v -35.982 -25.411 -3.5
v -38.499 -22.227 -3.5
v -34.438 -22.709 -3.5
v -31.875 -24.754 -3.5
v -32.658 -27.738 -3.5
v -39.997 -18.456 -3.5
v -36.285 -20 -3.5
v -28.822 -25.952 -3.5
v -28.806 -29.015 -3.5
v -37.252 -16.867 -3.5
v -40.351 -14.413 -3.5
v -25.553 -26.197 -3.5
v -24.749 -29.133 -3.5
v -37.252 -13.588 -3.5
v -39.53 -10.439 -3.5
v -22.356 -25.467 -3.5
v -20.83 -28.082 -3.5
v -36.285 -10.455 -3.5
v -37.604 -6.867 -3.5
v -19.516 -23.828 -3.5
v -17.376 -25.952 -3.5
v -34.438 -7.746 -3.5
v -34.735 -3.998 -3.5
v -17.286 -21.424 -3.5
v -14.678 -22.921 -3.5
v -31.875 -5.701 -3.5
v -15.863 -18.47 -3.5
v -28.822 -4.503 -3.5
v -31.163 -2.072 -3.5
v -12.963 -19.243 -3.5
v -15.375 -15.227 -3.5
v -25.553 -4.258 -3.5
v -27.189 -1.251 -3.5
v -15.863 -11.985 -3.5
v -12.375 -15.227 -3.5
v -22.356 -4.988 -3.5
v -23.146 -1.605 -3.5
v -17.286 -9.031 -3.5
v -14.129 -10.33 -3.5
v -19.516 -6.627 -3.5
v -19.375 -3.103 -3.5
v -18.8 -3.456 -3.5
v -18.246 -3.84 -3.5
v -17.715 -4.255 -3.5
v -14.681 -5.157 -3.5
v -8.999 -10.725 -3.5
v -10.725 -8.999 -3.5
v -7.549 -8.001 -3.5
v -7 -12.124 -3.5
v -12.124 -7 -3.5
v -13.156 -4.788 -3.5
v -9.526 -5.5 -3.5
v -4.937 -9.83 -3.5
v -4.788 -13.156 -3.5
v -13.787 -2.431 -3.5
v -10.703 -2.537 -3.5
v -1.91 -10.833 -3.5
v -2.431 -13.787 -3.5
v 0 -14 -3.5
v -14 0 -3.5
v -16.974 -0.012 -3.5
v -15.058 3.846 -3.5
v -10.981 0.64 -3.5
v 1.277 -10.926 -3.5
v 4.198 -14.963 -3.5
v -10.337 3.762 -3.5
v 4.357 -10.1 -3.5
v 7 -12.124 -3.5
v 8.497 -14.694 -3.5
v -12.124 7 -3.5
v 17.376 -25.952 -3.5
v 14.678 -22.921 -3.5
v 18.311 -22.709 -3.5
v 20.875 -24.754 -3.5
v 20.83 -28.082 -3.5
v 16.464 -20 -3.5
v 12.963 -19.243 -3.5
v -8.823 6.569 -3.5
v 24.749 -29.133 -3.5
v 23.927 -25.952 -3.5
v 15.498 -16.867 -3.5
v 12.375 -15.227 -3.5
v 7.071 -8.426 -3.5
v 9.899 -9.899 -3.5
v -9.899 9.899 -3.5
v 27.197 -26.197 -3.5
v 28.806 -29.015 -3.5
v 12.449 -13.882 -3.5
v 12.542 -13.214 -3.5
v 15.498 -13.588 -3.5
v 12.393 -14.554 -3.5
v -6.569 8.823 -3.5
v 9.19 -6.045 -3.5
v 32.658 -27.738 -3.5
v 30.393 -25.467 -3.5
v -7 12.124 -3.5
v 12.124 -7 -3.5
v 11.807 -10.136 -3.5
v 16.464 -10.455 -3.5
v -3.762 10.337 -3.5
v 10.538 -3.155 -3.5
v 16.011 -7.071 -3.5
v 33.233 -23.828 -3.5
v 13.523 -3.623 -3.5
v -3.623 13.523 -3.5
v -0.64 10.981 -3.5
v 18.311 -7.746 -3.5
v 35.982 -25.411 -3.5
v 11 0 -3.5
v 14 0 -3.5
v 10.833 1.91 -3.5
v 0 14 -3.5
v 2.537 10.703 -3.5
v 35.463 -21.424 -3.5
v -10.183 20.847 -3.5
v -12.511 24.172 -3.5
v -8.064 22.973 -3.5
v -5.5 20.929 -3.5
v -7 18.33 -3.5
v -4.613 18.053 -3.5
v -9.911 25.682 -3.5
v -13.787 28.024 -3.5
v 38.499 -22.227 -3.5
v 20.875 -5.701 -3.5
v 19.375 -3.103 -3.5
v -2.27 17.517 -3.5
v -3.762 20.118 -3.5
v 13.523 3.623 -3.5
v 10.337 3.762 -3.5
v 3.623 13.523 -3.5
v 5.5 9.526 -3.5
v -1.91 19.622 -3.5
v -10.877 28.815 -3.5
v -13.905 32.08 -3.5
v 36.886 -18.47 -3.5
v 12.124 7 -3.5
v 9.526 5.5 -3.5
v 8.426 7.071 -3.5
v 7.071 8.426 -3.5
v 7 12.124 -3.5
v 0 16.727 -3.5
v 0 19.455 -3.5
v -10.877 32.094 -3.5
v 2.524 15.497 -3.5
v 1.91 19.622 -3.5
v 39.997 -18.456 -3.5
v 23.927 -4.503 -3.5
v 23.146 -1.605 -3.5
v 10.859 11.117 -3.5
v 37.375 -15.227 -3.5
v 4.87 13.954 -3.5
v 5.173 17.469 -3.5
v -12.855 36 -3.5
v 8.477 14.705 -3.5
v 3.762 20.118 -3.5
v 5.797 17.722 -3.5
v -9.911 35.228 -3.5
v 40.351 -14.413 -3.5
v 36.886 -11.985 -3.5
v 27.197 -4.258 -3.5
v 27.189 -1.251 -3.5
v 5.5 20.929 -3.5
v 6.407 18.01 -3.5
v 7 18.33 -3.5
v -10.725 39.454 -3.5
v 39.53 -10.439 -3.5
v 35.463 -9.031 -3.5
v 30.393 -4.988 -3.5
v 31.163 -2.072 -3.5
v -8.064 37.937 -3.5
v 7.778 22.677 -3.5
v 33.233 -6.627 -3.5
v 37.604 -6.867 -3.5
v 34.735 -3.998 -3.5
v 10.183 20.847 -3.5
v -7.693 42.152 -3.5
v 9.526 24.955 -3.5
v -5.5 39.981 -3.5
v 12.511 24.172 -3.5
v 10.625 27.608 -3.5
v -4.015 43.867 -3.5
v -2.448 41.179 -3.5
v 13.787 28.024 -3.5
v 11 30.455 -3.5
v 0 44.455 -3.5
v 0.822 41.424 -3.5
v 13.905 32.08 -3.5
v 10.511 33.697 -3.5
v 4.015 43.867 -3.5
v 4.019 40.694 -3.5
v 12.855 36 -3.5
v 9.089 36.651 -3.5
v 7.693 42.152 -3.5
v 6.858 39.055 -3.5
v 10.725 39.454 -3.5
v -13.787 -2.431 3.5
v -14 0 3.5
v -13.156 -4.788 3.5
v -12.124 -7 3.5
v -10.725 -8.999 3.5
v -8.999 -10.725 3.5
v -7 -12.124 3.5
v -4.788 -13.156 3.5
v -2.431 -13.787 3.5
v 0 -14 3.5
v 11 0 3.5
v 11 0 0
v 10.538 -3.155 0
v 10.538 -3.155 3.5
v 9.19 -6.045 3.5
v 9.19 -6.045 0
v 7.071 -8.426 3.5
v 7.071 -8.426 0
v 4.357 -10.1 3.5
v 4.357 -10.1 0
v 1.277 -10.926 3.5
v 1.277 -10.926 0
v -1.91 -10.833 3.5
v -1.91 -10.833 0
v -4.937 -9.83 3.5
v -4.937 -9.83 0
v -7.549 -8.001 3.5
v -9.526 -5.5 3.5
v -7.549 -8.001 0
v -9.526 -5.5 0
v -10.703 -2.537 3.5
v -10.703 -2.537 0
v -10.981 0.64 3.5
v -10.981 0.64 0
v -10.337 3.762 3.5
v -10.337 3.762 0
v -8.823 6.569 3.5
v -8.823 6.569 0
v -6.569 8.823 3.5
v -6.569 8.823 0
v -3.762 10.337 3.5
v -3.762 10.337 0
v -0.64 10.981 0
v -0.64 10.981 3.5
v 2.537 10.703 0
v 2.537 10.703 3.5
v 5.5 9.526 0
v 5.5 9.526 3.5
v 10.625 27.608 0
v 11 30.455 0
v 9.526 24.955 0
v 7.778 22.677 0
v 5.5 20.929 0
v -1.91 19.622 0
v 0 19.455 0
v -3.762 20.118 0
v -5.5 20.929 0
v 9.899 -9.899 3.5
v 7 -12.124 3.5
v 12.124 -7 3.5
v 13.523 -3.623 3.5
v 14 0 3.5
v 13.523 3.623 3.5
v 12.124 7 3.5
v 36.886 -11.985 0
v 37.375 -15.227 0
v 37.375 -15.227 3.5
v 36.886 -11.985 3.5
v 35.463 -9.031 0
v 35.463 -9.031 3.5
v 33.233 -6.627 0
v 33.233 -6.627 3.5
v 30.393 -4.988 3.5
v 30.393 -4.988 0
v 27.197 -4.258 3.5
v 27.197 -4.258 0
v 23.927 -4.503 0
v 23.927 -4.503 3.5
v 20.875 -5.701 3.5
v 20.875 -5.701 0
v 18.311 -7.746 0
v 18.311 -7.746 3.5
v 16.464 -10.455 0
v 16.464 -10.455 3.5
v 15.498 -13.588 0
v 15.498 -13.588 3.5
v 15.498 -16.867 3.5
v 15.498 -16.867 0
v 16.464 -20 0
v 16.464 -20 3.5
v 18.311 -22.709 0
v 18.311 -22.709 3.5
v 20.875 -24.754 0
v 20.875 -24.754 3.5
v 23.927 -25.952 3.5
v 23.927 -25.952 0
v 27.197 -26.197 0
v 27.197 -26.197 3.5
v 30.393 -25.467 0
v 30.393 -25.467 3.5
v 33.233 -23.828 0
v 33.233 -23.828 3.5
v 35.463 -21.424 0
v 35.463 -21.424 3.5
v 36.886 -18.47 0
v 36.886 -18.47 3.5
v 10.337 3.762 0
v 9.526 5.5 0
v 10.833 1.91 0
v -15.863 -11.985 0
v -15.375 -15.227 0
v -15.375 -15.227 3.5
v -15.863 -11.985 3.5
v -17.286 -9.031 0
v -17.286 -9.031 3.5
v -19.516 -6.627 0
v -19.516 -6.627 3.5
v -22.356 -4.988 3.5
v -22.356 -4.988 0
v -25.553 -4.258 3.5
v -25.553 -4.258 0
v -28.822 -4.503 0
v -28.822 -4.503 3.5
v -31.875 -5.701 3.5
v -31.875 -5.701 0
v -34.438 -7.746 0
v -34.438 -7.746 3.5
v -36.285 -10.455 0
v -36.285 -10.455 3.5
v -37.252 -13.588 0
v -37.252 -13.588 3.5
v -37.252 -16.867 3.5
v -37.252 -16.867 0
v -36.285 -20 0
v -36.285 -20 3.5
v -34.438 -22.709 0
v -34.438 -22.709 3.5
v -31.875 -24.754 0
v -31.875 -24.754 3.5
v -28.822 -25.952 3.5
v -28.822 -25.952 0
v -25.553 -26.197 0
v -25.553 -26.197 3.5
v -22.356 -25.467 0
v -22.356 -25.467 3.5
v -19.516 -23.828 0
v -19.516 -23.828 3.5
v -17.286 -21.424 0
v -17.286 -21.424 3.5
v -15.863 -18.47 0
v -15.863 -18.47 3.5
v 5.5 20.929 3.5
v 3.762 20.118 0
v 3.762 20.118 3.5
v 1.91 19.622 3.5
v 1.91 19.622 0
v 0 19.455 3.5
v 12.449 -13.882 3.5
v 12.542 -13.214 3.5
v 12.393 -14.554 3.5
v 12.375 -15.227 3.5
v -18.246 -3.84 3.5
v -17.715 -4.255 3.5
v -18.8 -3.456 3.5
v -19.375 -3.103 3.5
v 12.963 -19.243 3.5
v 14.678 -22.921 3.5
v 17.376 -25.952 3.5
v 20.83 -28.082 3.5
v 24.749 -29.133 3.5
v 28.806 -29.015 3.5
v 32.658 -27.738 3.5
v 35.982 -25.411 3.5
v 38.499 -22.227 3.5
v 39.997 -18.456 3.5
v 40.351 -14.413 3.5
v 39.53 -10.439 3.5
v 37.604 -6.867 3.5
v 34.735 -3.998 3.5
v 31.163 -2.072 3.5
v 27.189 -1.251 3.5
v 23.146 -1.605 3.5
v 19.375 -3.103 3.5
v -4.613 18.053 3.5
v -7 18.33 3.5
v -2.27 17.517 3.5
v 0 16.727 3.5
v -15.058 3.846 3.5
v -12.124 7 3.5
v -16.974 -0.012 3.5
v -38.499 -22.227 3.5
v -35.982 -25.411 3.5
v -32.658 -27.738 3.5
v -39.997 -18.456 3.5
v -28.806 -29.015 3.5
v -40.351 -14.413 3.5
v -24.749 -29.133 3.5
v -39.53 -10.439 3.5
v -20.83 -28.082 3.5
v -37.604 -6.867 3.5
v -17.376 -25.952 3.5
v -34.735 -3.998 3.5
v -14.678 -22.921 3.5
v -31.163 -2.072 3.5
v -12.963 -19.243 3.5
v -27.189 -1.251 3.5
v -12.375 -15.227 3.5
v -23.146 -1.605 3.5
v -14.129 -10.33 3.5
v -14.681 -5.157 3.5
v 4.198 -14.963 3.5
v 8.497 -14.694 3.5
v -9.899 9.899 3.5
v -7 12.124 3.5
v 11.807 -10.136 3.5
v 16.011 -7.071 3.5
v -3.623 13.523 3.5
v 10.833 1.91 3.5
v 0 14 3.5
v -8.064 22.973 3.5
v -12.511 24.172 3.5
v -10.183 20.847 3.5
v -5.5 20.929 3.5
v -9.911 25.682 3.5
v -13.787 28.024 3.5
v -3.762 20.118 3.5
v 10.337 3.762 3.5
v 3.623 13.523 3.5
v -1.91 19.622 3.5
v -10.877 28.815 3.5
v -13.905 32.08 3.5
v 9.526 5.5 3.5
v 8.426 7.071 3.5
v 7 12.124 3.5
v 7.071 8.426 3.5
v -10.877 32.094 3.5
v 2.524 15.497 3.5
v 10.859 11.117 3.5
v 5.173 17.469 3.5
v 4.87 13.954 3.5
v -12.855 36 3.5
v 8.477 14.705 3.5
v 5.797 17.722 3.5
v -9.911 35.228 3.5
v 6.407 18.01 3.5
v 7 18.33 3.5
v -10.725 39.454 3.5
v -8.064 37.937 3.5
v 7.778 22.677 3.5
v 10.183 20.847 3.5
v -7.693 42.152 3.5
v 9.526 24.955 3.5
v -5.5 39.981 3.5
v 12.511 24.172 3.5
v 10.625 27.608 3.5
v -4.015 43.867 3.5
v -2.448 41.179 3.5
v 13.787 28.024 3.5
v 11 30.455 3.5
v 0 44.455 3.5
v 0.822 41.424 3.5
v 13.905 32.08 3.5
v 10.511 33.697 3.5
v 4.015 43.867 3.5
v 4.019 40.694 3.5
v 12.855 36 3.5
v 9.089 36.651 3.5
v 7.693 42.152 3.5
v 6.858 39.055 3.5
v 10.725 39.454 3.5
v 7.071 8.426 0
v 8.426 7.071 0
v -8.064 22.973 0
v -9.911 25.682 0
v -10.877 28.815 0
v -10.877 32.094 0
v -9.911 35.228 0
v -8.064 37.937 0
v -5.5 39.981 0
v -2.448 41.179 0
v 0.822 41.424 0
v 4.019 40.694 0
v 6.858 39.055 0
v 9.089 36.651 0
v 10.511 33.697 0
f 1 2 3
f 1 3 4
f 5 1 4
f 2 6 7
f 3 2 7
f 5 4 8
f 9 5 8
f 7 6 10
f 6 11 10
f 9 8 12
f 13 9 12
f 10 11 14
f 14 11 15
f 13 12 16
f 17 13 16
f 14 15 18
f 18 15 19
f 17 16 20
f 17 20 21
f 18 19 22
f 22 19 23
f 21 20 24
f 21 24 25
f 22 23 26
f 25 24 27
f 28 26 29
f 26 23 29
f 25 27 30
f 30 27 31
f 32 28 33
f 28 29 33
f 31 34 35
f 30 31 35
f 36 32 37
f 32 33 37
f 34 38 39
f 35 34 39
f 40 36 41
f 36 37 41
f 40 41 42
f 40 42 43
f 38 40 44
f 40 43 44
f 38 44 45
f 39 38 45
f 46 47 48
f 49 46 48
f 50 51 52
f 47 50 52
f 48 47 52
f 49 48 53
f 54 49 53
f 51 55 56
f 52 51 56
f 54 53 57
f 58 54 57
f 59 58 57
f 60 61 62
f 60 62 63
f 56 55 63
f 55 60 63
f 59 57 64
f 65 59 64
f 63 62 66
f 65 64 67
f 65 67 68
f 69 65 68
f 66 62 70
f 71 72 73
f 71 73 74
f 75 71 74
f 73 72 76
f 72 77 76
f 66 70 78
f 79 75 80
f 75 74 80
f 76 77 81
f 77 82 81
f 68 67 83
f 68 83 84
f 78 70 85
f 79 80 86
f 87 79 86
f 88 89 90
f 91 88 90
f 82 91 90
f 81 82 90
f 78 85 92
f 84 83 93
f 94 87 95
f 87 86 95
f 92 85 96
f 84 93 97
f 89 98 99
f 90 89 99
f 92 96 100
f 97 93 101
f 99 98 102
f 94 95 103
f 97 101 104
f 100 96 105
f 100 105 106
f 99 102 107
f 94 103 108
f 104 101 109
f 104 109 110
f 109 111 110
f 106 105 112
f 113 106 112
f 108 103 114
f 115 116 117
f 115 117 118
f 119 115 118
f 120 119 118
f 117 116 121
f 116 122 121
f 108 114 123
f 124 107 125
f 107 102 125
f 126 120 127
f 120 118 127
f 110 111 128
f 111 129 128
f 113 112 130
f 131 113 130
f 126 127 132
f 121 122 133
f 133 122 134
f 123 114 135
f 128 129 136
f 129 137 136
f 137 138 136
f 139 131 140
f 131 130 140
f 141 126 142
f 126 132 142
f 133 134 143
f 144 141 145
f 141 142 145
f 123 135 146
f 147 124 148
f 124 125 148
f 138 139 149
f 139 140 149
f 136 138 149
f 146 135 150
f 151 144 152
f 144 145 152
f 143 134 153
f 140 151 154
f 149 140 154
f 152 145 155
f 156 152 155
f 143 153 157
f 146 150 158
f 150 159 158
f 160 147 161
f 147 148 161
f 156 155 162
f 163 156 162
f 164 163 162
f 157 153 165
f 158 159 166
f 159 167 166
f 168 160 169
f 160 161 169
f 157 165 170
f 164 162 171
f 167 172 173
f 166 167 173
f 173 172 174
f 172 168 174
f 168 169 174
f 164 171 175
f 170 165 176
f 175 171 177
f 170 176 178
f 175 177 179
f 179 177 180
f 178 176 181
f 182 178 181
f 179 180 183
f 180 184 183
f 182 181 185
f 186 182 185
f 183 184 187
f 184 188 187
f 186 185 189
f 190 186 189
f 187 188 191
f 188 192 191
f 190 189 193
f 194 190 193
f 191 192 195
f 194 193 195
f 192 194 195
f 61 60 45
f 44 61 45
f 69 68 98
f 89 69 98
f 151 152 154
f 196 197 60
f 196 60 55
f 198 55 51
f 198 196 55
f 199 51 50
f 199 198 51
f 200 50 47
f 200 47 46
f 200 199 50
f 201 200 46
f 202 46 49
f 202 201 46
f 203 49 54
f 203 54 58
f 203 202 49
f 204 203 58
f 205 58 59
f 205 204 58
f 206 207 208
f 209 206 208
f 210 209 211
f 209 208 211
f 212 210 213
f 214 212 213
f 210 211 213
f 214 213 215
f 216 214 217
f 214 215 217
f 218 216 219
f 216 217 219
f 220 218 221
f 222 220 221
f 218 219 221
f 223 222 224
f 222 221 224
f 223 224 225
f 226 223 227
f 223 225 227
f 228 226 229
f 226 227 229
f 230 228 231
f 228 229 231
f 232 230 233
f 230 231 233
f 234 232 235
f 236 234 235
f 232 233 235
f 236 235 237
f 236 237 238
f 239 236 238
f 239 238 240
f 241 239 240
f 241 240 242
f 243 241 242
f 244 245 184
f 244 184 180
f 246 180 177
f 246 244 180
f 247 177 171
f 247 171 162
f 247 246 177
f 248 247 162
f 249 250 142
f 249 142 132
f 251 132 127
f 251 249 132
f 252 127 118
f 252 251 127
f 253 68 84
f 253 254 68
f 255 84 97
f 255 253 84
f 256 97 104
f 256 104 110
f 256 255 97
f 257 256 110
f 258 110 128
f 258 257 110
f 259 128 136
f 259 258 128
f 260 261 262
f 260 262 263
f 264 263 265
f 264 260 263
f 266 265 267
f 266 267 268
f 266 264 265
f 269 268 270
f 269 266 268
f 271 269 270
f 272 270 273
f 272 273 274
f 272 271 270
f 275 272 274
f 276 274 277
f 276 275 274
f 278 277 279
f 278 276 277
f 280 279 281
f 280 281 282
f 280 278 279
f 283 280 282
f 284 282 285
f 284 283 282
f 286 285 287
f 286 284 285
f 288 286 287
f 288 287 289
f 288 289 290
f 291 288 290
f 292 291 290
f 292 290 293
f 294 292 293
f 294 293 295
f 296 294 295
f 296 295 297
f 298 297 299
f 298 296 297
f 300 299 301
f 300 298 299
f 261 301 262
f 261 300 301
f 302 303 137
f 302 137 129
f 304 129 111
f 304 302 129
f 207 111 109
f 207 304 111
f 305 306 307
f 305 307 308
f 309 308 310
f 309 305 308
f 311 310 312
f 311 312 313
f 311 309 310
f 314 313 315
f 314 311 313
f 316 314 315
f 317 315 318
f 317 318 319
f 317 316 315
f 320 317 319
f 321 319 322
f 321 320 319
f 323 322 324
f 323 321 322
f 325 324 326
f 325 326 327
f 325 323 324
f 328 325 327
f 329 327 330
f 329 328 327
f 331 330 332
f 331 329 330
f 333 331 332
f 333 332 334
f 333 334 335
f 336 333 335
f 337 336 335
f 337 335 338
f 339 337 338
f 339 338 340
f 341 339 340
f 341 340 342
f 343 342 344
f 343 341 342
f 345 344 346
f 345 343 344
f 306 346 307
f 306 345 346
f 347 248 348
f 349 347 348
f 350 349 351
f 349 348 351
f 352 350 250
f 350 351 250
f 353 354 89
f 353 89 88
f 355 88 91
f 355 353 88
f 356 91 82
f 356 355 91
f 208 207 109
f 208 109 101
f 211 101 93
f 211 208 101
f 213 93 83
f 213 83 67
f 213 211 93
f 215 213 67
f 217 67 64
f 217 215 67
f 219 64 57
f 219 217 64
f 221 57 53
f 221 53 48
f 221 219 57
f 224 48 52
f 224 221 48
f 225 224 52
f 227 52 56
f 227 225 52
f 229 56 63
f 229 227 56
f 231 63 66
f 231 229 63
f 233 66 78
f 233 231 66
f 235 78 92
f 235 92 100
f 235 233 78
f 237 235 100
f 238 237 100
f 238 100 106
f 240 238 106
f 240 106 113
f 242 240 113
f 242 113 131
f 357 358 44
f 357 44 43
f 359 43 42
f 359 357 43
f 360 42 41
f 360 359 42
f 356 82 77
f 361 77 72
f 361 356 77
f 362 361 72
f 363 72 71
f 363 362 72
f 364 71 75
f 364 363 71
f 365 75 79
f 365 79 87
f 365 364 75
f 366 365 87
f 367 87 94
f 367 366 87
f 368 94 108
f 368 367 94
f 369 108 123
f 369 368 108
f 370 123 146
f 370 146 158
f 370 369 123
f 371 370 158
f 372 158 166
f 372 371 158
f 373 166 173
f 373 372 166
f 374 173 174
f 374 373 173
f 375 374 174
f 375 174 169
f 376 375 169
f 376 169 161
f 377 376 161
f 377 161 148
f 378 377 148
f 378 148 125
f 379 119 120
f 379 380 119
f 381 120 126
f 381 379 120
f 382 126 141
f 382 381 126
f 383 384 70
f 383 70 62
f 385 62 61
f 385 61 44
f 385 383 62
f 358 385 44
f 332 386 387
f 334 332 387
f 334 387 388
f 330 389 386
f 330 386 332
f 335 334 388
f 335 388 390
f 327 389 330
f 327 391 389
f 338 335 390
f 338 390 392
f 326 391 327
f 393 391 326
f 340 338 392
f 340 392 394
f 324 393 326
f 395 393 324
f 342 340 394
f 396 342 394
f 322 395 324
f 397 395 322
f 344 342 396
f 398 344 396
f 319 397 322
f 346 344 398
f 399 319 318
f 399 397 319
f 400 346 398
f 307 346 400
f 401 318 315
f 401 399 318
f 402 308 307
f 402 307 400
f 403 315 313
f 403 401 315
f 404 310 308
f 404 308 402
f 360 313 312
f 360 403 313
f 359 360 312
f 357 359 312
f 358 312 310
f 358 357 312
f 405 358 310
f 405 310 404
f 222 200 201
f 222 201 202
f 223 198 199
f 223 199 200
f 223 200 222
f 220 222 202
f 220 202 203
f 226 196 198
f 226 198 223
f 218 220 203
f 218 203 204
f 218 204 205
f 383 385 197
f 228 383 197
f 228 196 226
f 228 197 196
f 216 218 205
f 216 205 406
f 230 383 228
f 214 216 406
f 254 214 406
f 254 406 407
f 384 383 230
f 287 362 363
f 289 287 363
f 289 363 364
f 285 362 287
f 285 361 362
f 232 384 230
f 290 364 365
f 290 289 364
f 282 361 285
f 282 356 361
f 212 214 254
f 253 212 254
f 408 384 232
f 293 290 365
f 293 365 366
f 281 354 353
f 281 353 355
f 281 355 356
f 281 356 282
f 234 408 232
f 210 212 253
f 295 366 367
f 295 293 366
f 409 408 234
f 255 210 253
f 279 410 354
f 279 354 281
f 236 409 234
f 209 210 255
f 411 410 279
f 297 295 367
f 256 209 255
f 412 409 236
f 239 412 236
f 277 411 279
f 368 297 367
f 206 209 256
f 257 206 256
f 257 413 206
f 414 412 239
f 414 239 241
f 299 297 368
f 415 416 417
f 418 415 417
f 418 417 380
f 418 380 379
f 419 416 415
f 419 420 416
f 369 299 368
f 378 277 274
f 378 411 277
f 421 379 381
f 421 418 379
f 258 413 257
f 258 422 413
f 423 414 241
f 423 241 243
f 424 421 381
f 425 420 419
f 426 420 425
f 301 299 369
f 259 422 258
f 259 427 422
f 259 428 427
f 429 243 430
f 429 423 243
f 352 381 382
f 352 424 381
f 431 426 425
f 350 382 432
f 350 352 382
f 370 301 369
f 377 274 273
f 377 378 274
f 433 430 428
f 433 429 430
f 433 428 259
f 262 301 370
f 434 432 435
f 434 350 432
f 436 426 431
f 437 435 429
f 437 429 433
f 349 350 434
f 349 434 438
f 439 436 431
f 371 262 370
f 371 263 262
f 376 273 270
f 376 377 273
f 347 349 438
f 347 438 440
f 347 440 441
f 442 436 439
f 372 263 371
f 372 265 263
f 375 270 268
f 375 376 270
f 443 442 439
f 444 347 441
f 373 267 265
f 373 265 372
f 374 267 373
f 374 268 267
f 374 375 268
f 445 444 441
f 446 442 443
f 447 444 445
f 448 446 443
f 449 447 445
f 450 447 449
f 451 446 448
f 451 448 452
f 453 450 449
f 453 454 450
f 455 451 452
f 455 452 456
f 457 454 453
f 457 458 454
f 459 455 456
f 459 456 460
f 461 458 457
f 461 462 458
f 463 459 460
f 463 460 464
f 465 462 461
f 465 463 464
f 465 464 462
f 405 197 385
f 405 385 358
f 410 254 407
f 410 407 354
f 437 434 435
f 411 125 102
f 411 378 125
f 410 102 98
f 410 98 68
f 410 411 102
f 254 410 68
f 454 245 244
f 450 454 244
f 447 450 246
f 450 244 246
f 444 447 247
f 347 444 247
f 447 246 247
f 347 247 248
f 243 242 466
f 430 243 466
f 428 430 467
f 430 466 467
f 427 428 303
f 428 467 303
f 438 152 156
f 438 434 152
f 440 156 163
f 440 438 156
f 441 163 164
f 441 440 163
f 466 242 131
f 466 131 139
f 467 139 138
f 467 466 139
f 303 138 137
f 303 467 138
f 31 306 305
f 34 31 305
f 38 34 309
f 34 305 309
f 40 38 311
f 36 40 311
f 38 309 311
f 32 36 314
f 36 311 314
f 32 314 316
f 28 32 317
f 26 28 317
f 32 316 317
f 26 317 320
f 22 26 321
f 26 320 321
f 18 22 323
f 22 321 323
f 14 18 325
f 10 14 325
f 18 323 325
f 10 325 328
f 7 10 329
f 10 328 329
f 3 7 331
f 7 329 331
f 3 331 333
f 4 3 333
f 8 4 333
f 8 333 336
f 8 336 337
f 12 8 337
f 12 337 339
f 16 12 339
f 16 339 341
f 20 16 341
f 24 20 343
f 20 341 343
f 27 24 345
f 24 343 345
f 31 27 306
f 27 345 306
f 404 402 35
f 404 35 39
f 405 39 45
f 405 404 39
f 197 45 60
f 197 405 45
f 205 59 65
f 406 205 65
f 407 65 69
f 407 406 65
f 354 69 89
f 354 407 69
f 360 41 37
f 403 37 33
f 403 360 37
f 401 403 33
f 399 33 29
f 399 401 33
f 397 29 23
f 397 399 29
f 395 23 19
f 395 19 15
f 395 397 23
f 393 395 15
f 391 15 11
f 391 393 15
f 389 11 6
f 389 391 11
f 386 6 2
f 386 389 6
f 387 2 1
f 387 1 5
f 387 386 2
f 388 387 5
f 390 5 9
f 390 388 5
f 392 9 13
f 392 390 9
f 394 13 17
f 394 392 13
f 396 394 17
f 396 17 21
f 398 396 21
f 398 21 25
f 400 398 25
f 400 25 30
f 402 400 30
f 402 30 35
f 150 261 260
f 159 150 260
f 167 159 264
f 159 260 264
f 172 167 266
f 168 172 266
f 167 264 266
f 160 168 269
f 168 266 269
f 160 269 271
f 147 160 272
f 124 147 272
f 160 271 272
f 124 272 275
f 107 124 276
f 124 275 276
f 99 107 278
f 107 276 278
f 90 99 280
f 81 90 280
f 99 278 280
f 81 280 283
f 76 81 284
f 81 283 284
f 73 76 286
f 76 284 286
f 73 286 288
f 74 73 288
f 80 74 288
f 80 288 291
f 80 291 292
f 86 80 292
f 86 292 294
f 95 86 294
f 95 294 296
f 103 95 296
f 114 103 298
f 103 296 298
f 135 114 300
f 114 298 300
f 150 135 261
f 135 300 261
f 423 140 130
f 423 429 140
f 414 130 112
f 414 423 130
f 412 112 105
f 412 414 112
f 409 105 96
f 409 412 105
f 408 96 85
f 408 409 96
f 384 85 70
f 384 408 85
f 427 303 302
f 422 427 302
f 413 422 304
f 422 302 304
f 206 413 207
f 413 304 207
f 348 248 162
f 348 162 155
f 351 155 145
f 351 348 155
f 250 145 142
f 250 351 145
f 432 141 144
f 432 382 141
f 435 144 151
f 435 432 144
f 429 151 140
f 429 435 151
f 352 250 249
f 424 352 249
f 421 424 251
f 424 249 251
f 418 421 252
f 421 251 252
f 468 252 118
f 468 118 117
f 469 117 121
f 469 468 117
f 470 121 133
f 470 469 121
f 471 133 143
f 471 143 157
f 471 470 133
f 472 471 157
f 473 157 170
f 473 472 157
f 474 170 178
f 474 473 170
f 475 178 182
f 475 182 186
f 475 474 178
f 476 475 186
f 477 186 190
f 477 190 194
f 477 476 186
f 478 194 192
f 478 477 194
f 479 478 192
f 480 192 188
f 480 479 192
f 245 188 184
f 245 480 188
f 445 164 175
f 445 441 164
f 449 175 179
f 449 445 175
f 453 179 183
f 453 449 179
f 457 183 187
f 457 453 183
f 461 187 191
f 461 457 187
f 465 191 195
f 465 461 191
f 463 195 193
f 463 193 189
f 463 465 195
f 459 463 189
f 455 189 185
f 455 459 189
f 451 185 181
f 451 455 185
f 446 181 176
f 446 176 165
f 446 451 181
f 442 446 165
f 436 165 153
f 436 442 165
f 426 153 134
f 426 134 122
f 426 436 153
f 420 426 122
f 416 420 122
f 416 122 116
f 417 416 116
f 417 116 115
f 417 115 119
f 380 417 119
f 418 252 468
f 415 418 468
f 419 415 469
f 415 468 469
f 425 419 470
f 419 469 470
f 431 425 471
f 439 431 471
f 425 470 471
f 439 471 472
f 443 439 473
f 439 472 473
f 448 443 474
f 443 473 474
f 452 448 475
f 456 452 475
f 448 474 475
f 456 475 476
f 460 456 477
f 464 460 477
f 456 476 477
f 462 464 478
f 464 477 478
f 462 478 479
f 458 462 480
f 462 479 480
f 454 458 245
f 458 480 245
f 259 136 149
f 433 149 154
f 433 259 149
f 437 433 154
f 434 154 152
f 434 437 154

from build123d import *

# Parameters (mm, degrees)
F0_R     = 11
F1_DEPTH = 3.5


# Not quite as in the source:
# - a feature of the source that left no trace in its solid (it failed there, or was rolled back) is left out


with BuildPart() as f1:
    # F0 (on Top) → F1 (new body, symmetric)
    with BuildSketch(Plane.XY):
        with BuildLine():
            ThreePointArc((9.5262794416, 5.5), (10.6251840892, 2.8470094961), (11, 0))
            ThreePointArc((11, 0), (-9.5262794416, -5.5), (5.5, 9.5262794416))
            Line((5.5, 9.5262794416), (7, 12.124355653))
            ThreePointArc((7, 12.124355653), (-3.6234666314, 13.522961568), (-12.124355653, 7))
            ThreePointArc((-12.124355653, 7), (-13.522961568, 3.6234666314), (-14, 0))
            ThreePointArc((-14, 0), (-13.522961568, -3.6234666314), (-12.124355653, -7))
            ThreePointArc((-12.124355653, -7), (-9.8994949366, -9.8994949366), (-7, -12.124355653))
            ThreePointArc((-7, -12.124355653), (-3.6234666314, -13.522961568), (0, -14))
            ThreePointArc((0, -14), (3.6234666314, -13.522961568), (7, -12.124355653))
            ThreePointArc((7, -12.124355653), (13.522961568, -3.6234666314), (12.124355653, 7))
            Line((12.124355653, 7), (9.5262794416, 5.5))
        make_face()
        with BuildLine():
            ThreePointArc((5.5, 9.5262794416), (7.7781745931, 7.7781745931), (9.5262794416, 5.5))
            Line((9.5262794416, 5.5), (12.124355653, 7))
            ThreePointArc((12.124355653, 7), (9.7975961228, 12.9972967743), (5.1726973399, 17.4685035196))
            ThreePointArc((5.1726973399, 17.4685035196), (6.1042077739, 17.8616349143), (7, 18.3304848581))
            ThreePointArc((7, 18.3304848581), (0, 44.4548405111), (-7, 18.3304848581))
            ThreePointArc((-7, 18.3304848581), (-3.4339564303, 17.8173408021), (0, 16.7274202555))
            ThreePointArc((0, 16.7274202555), (3.7217872887, 14.7631656496), (7, 12.124355653))
            Line((7, 12.124355653), (5.5, 9.5262794416))
        make_face()
        with BuildLine():
            ThreePointArc((5.5, 20.9285610695), (2.8470094961, 19.8296564219), (0, 19.4548405111))
            ThreePointArc((0, 19.4548405111), (-2.8470094961, 19.8296564219), (-5.5, 20.9285610695))
            ThreePointArc((-5.5, 20.9285610695), (-5.5, 39.9811199527), (11, 30.4548405111))
            ThreePointArc((11, 30.4548405111), (9.5262794416, 24.9548405111), (5.5, 20.9285610695))
        make_face(mode=Mode.SUBTRACT)
        with BuildLine():
            ThreePointArc((-14, 0), (-13.522961568, 3.6234666314), (-12.124355653, 7))
            ThreePointArc((-12.124355653, 7), (-16.1547872485, 1.9863187512), (-17.714516484, -4.2545644573))
            ThreePointArc((-17.714516484, -4.2545644573), (-18.5207334759, -3.644418455), (-19.3746655508, -3.1030646026))
            ThreePointArc((-19.3746655508, -3.1030646026), (-38.4990212038, -22.2274202555), (-12.3746655508, -15.2274202555))
            ThreePointArc((-12.3746655508, -15.2274202555), (-14.5592658851, -7.760146629), (-14, 0))
        make_face()
        with Locations((-26.3746655508, -15.2274202555)):
            Circle(F0_R, mode=Mode.SUBTRACT)
        with BuildLine():
            ThreePointArc((19.3746655508, -3.1030646026), (14.0001170604, -8.7286208024), (7, -12.124355653))
            ThreePointArc((7, -12.124355653), (3.6234666314, -13.522961568), (0, -14))
            ThreePointArc((0, -14), (6.3571911257, -14.9836155256), (12.5418191441, -13.2139390623))
            ThreePointArc((12.5418191441, -13.2139390623), (12.416525702, -14.2172164593), (12.3746655508, -15.2274202555))
            ThreePointArc((12.3746655508, -15.2274202555), (38.4990212038, -22.2274202555), (19.3746655508, -3.1030646026))
        make_face()
        with Locations((26.3746655508, -15.2274202555)):
            Circle(F0_R, mode=Mode.SUBTRACT)
    extrude(amount=F1_DEPTH, both=True)


solid = f1.part
